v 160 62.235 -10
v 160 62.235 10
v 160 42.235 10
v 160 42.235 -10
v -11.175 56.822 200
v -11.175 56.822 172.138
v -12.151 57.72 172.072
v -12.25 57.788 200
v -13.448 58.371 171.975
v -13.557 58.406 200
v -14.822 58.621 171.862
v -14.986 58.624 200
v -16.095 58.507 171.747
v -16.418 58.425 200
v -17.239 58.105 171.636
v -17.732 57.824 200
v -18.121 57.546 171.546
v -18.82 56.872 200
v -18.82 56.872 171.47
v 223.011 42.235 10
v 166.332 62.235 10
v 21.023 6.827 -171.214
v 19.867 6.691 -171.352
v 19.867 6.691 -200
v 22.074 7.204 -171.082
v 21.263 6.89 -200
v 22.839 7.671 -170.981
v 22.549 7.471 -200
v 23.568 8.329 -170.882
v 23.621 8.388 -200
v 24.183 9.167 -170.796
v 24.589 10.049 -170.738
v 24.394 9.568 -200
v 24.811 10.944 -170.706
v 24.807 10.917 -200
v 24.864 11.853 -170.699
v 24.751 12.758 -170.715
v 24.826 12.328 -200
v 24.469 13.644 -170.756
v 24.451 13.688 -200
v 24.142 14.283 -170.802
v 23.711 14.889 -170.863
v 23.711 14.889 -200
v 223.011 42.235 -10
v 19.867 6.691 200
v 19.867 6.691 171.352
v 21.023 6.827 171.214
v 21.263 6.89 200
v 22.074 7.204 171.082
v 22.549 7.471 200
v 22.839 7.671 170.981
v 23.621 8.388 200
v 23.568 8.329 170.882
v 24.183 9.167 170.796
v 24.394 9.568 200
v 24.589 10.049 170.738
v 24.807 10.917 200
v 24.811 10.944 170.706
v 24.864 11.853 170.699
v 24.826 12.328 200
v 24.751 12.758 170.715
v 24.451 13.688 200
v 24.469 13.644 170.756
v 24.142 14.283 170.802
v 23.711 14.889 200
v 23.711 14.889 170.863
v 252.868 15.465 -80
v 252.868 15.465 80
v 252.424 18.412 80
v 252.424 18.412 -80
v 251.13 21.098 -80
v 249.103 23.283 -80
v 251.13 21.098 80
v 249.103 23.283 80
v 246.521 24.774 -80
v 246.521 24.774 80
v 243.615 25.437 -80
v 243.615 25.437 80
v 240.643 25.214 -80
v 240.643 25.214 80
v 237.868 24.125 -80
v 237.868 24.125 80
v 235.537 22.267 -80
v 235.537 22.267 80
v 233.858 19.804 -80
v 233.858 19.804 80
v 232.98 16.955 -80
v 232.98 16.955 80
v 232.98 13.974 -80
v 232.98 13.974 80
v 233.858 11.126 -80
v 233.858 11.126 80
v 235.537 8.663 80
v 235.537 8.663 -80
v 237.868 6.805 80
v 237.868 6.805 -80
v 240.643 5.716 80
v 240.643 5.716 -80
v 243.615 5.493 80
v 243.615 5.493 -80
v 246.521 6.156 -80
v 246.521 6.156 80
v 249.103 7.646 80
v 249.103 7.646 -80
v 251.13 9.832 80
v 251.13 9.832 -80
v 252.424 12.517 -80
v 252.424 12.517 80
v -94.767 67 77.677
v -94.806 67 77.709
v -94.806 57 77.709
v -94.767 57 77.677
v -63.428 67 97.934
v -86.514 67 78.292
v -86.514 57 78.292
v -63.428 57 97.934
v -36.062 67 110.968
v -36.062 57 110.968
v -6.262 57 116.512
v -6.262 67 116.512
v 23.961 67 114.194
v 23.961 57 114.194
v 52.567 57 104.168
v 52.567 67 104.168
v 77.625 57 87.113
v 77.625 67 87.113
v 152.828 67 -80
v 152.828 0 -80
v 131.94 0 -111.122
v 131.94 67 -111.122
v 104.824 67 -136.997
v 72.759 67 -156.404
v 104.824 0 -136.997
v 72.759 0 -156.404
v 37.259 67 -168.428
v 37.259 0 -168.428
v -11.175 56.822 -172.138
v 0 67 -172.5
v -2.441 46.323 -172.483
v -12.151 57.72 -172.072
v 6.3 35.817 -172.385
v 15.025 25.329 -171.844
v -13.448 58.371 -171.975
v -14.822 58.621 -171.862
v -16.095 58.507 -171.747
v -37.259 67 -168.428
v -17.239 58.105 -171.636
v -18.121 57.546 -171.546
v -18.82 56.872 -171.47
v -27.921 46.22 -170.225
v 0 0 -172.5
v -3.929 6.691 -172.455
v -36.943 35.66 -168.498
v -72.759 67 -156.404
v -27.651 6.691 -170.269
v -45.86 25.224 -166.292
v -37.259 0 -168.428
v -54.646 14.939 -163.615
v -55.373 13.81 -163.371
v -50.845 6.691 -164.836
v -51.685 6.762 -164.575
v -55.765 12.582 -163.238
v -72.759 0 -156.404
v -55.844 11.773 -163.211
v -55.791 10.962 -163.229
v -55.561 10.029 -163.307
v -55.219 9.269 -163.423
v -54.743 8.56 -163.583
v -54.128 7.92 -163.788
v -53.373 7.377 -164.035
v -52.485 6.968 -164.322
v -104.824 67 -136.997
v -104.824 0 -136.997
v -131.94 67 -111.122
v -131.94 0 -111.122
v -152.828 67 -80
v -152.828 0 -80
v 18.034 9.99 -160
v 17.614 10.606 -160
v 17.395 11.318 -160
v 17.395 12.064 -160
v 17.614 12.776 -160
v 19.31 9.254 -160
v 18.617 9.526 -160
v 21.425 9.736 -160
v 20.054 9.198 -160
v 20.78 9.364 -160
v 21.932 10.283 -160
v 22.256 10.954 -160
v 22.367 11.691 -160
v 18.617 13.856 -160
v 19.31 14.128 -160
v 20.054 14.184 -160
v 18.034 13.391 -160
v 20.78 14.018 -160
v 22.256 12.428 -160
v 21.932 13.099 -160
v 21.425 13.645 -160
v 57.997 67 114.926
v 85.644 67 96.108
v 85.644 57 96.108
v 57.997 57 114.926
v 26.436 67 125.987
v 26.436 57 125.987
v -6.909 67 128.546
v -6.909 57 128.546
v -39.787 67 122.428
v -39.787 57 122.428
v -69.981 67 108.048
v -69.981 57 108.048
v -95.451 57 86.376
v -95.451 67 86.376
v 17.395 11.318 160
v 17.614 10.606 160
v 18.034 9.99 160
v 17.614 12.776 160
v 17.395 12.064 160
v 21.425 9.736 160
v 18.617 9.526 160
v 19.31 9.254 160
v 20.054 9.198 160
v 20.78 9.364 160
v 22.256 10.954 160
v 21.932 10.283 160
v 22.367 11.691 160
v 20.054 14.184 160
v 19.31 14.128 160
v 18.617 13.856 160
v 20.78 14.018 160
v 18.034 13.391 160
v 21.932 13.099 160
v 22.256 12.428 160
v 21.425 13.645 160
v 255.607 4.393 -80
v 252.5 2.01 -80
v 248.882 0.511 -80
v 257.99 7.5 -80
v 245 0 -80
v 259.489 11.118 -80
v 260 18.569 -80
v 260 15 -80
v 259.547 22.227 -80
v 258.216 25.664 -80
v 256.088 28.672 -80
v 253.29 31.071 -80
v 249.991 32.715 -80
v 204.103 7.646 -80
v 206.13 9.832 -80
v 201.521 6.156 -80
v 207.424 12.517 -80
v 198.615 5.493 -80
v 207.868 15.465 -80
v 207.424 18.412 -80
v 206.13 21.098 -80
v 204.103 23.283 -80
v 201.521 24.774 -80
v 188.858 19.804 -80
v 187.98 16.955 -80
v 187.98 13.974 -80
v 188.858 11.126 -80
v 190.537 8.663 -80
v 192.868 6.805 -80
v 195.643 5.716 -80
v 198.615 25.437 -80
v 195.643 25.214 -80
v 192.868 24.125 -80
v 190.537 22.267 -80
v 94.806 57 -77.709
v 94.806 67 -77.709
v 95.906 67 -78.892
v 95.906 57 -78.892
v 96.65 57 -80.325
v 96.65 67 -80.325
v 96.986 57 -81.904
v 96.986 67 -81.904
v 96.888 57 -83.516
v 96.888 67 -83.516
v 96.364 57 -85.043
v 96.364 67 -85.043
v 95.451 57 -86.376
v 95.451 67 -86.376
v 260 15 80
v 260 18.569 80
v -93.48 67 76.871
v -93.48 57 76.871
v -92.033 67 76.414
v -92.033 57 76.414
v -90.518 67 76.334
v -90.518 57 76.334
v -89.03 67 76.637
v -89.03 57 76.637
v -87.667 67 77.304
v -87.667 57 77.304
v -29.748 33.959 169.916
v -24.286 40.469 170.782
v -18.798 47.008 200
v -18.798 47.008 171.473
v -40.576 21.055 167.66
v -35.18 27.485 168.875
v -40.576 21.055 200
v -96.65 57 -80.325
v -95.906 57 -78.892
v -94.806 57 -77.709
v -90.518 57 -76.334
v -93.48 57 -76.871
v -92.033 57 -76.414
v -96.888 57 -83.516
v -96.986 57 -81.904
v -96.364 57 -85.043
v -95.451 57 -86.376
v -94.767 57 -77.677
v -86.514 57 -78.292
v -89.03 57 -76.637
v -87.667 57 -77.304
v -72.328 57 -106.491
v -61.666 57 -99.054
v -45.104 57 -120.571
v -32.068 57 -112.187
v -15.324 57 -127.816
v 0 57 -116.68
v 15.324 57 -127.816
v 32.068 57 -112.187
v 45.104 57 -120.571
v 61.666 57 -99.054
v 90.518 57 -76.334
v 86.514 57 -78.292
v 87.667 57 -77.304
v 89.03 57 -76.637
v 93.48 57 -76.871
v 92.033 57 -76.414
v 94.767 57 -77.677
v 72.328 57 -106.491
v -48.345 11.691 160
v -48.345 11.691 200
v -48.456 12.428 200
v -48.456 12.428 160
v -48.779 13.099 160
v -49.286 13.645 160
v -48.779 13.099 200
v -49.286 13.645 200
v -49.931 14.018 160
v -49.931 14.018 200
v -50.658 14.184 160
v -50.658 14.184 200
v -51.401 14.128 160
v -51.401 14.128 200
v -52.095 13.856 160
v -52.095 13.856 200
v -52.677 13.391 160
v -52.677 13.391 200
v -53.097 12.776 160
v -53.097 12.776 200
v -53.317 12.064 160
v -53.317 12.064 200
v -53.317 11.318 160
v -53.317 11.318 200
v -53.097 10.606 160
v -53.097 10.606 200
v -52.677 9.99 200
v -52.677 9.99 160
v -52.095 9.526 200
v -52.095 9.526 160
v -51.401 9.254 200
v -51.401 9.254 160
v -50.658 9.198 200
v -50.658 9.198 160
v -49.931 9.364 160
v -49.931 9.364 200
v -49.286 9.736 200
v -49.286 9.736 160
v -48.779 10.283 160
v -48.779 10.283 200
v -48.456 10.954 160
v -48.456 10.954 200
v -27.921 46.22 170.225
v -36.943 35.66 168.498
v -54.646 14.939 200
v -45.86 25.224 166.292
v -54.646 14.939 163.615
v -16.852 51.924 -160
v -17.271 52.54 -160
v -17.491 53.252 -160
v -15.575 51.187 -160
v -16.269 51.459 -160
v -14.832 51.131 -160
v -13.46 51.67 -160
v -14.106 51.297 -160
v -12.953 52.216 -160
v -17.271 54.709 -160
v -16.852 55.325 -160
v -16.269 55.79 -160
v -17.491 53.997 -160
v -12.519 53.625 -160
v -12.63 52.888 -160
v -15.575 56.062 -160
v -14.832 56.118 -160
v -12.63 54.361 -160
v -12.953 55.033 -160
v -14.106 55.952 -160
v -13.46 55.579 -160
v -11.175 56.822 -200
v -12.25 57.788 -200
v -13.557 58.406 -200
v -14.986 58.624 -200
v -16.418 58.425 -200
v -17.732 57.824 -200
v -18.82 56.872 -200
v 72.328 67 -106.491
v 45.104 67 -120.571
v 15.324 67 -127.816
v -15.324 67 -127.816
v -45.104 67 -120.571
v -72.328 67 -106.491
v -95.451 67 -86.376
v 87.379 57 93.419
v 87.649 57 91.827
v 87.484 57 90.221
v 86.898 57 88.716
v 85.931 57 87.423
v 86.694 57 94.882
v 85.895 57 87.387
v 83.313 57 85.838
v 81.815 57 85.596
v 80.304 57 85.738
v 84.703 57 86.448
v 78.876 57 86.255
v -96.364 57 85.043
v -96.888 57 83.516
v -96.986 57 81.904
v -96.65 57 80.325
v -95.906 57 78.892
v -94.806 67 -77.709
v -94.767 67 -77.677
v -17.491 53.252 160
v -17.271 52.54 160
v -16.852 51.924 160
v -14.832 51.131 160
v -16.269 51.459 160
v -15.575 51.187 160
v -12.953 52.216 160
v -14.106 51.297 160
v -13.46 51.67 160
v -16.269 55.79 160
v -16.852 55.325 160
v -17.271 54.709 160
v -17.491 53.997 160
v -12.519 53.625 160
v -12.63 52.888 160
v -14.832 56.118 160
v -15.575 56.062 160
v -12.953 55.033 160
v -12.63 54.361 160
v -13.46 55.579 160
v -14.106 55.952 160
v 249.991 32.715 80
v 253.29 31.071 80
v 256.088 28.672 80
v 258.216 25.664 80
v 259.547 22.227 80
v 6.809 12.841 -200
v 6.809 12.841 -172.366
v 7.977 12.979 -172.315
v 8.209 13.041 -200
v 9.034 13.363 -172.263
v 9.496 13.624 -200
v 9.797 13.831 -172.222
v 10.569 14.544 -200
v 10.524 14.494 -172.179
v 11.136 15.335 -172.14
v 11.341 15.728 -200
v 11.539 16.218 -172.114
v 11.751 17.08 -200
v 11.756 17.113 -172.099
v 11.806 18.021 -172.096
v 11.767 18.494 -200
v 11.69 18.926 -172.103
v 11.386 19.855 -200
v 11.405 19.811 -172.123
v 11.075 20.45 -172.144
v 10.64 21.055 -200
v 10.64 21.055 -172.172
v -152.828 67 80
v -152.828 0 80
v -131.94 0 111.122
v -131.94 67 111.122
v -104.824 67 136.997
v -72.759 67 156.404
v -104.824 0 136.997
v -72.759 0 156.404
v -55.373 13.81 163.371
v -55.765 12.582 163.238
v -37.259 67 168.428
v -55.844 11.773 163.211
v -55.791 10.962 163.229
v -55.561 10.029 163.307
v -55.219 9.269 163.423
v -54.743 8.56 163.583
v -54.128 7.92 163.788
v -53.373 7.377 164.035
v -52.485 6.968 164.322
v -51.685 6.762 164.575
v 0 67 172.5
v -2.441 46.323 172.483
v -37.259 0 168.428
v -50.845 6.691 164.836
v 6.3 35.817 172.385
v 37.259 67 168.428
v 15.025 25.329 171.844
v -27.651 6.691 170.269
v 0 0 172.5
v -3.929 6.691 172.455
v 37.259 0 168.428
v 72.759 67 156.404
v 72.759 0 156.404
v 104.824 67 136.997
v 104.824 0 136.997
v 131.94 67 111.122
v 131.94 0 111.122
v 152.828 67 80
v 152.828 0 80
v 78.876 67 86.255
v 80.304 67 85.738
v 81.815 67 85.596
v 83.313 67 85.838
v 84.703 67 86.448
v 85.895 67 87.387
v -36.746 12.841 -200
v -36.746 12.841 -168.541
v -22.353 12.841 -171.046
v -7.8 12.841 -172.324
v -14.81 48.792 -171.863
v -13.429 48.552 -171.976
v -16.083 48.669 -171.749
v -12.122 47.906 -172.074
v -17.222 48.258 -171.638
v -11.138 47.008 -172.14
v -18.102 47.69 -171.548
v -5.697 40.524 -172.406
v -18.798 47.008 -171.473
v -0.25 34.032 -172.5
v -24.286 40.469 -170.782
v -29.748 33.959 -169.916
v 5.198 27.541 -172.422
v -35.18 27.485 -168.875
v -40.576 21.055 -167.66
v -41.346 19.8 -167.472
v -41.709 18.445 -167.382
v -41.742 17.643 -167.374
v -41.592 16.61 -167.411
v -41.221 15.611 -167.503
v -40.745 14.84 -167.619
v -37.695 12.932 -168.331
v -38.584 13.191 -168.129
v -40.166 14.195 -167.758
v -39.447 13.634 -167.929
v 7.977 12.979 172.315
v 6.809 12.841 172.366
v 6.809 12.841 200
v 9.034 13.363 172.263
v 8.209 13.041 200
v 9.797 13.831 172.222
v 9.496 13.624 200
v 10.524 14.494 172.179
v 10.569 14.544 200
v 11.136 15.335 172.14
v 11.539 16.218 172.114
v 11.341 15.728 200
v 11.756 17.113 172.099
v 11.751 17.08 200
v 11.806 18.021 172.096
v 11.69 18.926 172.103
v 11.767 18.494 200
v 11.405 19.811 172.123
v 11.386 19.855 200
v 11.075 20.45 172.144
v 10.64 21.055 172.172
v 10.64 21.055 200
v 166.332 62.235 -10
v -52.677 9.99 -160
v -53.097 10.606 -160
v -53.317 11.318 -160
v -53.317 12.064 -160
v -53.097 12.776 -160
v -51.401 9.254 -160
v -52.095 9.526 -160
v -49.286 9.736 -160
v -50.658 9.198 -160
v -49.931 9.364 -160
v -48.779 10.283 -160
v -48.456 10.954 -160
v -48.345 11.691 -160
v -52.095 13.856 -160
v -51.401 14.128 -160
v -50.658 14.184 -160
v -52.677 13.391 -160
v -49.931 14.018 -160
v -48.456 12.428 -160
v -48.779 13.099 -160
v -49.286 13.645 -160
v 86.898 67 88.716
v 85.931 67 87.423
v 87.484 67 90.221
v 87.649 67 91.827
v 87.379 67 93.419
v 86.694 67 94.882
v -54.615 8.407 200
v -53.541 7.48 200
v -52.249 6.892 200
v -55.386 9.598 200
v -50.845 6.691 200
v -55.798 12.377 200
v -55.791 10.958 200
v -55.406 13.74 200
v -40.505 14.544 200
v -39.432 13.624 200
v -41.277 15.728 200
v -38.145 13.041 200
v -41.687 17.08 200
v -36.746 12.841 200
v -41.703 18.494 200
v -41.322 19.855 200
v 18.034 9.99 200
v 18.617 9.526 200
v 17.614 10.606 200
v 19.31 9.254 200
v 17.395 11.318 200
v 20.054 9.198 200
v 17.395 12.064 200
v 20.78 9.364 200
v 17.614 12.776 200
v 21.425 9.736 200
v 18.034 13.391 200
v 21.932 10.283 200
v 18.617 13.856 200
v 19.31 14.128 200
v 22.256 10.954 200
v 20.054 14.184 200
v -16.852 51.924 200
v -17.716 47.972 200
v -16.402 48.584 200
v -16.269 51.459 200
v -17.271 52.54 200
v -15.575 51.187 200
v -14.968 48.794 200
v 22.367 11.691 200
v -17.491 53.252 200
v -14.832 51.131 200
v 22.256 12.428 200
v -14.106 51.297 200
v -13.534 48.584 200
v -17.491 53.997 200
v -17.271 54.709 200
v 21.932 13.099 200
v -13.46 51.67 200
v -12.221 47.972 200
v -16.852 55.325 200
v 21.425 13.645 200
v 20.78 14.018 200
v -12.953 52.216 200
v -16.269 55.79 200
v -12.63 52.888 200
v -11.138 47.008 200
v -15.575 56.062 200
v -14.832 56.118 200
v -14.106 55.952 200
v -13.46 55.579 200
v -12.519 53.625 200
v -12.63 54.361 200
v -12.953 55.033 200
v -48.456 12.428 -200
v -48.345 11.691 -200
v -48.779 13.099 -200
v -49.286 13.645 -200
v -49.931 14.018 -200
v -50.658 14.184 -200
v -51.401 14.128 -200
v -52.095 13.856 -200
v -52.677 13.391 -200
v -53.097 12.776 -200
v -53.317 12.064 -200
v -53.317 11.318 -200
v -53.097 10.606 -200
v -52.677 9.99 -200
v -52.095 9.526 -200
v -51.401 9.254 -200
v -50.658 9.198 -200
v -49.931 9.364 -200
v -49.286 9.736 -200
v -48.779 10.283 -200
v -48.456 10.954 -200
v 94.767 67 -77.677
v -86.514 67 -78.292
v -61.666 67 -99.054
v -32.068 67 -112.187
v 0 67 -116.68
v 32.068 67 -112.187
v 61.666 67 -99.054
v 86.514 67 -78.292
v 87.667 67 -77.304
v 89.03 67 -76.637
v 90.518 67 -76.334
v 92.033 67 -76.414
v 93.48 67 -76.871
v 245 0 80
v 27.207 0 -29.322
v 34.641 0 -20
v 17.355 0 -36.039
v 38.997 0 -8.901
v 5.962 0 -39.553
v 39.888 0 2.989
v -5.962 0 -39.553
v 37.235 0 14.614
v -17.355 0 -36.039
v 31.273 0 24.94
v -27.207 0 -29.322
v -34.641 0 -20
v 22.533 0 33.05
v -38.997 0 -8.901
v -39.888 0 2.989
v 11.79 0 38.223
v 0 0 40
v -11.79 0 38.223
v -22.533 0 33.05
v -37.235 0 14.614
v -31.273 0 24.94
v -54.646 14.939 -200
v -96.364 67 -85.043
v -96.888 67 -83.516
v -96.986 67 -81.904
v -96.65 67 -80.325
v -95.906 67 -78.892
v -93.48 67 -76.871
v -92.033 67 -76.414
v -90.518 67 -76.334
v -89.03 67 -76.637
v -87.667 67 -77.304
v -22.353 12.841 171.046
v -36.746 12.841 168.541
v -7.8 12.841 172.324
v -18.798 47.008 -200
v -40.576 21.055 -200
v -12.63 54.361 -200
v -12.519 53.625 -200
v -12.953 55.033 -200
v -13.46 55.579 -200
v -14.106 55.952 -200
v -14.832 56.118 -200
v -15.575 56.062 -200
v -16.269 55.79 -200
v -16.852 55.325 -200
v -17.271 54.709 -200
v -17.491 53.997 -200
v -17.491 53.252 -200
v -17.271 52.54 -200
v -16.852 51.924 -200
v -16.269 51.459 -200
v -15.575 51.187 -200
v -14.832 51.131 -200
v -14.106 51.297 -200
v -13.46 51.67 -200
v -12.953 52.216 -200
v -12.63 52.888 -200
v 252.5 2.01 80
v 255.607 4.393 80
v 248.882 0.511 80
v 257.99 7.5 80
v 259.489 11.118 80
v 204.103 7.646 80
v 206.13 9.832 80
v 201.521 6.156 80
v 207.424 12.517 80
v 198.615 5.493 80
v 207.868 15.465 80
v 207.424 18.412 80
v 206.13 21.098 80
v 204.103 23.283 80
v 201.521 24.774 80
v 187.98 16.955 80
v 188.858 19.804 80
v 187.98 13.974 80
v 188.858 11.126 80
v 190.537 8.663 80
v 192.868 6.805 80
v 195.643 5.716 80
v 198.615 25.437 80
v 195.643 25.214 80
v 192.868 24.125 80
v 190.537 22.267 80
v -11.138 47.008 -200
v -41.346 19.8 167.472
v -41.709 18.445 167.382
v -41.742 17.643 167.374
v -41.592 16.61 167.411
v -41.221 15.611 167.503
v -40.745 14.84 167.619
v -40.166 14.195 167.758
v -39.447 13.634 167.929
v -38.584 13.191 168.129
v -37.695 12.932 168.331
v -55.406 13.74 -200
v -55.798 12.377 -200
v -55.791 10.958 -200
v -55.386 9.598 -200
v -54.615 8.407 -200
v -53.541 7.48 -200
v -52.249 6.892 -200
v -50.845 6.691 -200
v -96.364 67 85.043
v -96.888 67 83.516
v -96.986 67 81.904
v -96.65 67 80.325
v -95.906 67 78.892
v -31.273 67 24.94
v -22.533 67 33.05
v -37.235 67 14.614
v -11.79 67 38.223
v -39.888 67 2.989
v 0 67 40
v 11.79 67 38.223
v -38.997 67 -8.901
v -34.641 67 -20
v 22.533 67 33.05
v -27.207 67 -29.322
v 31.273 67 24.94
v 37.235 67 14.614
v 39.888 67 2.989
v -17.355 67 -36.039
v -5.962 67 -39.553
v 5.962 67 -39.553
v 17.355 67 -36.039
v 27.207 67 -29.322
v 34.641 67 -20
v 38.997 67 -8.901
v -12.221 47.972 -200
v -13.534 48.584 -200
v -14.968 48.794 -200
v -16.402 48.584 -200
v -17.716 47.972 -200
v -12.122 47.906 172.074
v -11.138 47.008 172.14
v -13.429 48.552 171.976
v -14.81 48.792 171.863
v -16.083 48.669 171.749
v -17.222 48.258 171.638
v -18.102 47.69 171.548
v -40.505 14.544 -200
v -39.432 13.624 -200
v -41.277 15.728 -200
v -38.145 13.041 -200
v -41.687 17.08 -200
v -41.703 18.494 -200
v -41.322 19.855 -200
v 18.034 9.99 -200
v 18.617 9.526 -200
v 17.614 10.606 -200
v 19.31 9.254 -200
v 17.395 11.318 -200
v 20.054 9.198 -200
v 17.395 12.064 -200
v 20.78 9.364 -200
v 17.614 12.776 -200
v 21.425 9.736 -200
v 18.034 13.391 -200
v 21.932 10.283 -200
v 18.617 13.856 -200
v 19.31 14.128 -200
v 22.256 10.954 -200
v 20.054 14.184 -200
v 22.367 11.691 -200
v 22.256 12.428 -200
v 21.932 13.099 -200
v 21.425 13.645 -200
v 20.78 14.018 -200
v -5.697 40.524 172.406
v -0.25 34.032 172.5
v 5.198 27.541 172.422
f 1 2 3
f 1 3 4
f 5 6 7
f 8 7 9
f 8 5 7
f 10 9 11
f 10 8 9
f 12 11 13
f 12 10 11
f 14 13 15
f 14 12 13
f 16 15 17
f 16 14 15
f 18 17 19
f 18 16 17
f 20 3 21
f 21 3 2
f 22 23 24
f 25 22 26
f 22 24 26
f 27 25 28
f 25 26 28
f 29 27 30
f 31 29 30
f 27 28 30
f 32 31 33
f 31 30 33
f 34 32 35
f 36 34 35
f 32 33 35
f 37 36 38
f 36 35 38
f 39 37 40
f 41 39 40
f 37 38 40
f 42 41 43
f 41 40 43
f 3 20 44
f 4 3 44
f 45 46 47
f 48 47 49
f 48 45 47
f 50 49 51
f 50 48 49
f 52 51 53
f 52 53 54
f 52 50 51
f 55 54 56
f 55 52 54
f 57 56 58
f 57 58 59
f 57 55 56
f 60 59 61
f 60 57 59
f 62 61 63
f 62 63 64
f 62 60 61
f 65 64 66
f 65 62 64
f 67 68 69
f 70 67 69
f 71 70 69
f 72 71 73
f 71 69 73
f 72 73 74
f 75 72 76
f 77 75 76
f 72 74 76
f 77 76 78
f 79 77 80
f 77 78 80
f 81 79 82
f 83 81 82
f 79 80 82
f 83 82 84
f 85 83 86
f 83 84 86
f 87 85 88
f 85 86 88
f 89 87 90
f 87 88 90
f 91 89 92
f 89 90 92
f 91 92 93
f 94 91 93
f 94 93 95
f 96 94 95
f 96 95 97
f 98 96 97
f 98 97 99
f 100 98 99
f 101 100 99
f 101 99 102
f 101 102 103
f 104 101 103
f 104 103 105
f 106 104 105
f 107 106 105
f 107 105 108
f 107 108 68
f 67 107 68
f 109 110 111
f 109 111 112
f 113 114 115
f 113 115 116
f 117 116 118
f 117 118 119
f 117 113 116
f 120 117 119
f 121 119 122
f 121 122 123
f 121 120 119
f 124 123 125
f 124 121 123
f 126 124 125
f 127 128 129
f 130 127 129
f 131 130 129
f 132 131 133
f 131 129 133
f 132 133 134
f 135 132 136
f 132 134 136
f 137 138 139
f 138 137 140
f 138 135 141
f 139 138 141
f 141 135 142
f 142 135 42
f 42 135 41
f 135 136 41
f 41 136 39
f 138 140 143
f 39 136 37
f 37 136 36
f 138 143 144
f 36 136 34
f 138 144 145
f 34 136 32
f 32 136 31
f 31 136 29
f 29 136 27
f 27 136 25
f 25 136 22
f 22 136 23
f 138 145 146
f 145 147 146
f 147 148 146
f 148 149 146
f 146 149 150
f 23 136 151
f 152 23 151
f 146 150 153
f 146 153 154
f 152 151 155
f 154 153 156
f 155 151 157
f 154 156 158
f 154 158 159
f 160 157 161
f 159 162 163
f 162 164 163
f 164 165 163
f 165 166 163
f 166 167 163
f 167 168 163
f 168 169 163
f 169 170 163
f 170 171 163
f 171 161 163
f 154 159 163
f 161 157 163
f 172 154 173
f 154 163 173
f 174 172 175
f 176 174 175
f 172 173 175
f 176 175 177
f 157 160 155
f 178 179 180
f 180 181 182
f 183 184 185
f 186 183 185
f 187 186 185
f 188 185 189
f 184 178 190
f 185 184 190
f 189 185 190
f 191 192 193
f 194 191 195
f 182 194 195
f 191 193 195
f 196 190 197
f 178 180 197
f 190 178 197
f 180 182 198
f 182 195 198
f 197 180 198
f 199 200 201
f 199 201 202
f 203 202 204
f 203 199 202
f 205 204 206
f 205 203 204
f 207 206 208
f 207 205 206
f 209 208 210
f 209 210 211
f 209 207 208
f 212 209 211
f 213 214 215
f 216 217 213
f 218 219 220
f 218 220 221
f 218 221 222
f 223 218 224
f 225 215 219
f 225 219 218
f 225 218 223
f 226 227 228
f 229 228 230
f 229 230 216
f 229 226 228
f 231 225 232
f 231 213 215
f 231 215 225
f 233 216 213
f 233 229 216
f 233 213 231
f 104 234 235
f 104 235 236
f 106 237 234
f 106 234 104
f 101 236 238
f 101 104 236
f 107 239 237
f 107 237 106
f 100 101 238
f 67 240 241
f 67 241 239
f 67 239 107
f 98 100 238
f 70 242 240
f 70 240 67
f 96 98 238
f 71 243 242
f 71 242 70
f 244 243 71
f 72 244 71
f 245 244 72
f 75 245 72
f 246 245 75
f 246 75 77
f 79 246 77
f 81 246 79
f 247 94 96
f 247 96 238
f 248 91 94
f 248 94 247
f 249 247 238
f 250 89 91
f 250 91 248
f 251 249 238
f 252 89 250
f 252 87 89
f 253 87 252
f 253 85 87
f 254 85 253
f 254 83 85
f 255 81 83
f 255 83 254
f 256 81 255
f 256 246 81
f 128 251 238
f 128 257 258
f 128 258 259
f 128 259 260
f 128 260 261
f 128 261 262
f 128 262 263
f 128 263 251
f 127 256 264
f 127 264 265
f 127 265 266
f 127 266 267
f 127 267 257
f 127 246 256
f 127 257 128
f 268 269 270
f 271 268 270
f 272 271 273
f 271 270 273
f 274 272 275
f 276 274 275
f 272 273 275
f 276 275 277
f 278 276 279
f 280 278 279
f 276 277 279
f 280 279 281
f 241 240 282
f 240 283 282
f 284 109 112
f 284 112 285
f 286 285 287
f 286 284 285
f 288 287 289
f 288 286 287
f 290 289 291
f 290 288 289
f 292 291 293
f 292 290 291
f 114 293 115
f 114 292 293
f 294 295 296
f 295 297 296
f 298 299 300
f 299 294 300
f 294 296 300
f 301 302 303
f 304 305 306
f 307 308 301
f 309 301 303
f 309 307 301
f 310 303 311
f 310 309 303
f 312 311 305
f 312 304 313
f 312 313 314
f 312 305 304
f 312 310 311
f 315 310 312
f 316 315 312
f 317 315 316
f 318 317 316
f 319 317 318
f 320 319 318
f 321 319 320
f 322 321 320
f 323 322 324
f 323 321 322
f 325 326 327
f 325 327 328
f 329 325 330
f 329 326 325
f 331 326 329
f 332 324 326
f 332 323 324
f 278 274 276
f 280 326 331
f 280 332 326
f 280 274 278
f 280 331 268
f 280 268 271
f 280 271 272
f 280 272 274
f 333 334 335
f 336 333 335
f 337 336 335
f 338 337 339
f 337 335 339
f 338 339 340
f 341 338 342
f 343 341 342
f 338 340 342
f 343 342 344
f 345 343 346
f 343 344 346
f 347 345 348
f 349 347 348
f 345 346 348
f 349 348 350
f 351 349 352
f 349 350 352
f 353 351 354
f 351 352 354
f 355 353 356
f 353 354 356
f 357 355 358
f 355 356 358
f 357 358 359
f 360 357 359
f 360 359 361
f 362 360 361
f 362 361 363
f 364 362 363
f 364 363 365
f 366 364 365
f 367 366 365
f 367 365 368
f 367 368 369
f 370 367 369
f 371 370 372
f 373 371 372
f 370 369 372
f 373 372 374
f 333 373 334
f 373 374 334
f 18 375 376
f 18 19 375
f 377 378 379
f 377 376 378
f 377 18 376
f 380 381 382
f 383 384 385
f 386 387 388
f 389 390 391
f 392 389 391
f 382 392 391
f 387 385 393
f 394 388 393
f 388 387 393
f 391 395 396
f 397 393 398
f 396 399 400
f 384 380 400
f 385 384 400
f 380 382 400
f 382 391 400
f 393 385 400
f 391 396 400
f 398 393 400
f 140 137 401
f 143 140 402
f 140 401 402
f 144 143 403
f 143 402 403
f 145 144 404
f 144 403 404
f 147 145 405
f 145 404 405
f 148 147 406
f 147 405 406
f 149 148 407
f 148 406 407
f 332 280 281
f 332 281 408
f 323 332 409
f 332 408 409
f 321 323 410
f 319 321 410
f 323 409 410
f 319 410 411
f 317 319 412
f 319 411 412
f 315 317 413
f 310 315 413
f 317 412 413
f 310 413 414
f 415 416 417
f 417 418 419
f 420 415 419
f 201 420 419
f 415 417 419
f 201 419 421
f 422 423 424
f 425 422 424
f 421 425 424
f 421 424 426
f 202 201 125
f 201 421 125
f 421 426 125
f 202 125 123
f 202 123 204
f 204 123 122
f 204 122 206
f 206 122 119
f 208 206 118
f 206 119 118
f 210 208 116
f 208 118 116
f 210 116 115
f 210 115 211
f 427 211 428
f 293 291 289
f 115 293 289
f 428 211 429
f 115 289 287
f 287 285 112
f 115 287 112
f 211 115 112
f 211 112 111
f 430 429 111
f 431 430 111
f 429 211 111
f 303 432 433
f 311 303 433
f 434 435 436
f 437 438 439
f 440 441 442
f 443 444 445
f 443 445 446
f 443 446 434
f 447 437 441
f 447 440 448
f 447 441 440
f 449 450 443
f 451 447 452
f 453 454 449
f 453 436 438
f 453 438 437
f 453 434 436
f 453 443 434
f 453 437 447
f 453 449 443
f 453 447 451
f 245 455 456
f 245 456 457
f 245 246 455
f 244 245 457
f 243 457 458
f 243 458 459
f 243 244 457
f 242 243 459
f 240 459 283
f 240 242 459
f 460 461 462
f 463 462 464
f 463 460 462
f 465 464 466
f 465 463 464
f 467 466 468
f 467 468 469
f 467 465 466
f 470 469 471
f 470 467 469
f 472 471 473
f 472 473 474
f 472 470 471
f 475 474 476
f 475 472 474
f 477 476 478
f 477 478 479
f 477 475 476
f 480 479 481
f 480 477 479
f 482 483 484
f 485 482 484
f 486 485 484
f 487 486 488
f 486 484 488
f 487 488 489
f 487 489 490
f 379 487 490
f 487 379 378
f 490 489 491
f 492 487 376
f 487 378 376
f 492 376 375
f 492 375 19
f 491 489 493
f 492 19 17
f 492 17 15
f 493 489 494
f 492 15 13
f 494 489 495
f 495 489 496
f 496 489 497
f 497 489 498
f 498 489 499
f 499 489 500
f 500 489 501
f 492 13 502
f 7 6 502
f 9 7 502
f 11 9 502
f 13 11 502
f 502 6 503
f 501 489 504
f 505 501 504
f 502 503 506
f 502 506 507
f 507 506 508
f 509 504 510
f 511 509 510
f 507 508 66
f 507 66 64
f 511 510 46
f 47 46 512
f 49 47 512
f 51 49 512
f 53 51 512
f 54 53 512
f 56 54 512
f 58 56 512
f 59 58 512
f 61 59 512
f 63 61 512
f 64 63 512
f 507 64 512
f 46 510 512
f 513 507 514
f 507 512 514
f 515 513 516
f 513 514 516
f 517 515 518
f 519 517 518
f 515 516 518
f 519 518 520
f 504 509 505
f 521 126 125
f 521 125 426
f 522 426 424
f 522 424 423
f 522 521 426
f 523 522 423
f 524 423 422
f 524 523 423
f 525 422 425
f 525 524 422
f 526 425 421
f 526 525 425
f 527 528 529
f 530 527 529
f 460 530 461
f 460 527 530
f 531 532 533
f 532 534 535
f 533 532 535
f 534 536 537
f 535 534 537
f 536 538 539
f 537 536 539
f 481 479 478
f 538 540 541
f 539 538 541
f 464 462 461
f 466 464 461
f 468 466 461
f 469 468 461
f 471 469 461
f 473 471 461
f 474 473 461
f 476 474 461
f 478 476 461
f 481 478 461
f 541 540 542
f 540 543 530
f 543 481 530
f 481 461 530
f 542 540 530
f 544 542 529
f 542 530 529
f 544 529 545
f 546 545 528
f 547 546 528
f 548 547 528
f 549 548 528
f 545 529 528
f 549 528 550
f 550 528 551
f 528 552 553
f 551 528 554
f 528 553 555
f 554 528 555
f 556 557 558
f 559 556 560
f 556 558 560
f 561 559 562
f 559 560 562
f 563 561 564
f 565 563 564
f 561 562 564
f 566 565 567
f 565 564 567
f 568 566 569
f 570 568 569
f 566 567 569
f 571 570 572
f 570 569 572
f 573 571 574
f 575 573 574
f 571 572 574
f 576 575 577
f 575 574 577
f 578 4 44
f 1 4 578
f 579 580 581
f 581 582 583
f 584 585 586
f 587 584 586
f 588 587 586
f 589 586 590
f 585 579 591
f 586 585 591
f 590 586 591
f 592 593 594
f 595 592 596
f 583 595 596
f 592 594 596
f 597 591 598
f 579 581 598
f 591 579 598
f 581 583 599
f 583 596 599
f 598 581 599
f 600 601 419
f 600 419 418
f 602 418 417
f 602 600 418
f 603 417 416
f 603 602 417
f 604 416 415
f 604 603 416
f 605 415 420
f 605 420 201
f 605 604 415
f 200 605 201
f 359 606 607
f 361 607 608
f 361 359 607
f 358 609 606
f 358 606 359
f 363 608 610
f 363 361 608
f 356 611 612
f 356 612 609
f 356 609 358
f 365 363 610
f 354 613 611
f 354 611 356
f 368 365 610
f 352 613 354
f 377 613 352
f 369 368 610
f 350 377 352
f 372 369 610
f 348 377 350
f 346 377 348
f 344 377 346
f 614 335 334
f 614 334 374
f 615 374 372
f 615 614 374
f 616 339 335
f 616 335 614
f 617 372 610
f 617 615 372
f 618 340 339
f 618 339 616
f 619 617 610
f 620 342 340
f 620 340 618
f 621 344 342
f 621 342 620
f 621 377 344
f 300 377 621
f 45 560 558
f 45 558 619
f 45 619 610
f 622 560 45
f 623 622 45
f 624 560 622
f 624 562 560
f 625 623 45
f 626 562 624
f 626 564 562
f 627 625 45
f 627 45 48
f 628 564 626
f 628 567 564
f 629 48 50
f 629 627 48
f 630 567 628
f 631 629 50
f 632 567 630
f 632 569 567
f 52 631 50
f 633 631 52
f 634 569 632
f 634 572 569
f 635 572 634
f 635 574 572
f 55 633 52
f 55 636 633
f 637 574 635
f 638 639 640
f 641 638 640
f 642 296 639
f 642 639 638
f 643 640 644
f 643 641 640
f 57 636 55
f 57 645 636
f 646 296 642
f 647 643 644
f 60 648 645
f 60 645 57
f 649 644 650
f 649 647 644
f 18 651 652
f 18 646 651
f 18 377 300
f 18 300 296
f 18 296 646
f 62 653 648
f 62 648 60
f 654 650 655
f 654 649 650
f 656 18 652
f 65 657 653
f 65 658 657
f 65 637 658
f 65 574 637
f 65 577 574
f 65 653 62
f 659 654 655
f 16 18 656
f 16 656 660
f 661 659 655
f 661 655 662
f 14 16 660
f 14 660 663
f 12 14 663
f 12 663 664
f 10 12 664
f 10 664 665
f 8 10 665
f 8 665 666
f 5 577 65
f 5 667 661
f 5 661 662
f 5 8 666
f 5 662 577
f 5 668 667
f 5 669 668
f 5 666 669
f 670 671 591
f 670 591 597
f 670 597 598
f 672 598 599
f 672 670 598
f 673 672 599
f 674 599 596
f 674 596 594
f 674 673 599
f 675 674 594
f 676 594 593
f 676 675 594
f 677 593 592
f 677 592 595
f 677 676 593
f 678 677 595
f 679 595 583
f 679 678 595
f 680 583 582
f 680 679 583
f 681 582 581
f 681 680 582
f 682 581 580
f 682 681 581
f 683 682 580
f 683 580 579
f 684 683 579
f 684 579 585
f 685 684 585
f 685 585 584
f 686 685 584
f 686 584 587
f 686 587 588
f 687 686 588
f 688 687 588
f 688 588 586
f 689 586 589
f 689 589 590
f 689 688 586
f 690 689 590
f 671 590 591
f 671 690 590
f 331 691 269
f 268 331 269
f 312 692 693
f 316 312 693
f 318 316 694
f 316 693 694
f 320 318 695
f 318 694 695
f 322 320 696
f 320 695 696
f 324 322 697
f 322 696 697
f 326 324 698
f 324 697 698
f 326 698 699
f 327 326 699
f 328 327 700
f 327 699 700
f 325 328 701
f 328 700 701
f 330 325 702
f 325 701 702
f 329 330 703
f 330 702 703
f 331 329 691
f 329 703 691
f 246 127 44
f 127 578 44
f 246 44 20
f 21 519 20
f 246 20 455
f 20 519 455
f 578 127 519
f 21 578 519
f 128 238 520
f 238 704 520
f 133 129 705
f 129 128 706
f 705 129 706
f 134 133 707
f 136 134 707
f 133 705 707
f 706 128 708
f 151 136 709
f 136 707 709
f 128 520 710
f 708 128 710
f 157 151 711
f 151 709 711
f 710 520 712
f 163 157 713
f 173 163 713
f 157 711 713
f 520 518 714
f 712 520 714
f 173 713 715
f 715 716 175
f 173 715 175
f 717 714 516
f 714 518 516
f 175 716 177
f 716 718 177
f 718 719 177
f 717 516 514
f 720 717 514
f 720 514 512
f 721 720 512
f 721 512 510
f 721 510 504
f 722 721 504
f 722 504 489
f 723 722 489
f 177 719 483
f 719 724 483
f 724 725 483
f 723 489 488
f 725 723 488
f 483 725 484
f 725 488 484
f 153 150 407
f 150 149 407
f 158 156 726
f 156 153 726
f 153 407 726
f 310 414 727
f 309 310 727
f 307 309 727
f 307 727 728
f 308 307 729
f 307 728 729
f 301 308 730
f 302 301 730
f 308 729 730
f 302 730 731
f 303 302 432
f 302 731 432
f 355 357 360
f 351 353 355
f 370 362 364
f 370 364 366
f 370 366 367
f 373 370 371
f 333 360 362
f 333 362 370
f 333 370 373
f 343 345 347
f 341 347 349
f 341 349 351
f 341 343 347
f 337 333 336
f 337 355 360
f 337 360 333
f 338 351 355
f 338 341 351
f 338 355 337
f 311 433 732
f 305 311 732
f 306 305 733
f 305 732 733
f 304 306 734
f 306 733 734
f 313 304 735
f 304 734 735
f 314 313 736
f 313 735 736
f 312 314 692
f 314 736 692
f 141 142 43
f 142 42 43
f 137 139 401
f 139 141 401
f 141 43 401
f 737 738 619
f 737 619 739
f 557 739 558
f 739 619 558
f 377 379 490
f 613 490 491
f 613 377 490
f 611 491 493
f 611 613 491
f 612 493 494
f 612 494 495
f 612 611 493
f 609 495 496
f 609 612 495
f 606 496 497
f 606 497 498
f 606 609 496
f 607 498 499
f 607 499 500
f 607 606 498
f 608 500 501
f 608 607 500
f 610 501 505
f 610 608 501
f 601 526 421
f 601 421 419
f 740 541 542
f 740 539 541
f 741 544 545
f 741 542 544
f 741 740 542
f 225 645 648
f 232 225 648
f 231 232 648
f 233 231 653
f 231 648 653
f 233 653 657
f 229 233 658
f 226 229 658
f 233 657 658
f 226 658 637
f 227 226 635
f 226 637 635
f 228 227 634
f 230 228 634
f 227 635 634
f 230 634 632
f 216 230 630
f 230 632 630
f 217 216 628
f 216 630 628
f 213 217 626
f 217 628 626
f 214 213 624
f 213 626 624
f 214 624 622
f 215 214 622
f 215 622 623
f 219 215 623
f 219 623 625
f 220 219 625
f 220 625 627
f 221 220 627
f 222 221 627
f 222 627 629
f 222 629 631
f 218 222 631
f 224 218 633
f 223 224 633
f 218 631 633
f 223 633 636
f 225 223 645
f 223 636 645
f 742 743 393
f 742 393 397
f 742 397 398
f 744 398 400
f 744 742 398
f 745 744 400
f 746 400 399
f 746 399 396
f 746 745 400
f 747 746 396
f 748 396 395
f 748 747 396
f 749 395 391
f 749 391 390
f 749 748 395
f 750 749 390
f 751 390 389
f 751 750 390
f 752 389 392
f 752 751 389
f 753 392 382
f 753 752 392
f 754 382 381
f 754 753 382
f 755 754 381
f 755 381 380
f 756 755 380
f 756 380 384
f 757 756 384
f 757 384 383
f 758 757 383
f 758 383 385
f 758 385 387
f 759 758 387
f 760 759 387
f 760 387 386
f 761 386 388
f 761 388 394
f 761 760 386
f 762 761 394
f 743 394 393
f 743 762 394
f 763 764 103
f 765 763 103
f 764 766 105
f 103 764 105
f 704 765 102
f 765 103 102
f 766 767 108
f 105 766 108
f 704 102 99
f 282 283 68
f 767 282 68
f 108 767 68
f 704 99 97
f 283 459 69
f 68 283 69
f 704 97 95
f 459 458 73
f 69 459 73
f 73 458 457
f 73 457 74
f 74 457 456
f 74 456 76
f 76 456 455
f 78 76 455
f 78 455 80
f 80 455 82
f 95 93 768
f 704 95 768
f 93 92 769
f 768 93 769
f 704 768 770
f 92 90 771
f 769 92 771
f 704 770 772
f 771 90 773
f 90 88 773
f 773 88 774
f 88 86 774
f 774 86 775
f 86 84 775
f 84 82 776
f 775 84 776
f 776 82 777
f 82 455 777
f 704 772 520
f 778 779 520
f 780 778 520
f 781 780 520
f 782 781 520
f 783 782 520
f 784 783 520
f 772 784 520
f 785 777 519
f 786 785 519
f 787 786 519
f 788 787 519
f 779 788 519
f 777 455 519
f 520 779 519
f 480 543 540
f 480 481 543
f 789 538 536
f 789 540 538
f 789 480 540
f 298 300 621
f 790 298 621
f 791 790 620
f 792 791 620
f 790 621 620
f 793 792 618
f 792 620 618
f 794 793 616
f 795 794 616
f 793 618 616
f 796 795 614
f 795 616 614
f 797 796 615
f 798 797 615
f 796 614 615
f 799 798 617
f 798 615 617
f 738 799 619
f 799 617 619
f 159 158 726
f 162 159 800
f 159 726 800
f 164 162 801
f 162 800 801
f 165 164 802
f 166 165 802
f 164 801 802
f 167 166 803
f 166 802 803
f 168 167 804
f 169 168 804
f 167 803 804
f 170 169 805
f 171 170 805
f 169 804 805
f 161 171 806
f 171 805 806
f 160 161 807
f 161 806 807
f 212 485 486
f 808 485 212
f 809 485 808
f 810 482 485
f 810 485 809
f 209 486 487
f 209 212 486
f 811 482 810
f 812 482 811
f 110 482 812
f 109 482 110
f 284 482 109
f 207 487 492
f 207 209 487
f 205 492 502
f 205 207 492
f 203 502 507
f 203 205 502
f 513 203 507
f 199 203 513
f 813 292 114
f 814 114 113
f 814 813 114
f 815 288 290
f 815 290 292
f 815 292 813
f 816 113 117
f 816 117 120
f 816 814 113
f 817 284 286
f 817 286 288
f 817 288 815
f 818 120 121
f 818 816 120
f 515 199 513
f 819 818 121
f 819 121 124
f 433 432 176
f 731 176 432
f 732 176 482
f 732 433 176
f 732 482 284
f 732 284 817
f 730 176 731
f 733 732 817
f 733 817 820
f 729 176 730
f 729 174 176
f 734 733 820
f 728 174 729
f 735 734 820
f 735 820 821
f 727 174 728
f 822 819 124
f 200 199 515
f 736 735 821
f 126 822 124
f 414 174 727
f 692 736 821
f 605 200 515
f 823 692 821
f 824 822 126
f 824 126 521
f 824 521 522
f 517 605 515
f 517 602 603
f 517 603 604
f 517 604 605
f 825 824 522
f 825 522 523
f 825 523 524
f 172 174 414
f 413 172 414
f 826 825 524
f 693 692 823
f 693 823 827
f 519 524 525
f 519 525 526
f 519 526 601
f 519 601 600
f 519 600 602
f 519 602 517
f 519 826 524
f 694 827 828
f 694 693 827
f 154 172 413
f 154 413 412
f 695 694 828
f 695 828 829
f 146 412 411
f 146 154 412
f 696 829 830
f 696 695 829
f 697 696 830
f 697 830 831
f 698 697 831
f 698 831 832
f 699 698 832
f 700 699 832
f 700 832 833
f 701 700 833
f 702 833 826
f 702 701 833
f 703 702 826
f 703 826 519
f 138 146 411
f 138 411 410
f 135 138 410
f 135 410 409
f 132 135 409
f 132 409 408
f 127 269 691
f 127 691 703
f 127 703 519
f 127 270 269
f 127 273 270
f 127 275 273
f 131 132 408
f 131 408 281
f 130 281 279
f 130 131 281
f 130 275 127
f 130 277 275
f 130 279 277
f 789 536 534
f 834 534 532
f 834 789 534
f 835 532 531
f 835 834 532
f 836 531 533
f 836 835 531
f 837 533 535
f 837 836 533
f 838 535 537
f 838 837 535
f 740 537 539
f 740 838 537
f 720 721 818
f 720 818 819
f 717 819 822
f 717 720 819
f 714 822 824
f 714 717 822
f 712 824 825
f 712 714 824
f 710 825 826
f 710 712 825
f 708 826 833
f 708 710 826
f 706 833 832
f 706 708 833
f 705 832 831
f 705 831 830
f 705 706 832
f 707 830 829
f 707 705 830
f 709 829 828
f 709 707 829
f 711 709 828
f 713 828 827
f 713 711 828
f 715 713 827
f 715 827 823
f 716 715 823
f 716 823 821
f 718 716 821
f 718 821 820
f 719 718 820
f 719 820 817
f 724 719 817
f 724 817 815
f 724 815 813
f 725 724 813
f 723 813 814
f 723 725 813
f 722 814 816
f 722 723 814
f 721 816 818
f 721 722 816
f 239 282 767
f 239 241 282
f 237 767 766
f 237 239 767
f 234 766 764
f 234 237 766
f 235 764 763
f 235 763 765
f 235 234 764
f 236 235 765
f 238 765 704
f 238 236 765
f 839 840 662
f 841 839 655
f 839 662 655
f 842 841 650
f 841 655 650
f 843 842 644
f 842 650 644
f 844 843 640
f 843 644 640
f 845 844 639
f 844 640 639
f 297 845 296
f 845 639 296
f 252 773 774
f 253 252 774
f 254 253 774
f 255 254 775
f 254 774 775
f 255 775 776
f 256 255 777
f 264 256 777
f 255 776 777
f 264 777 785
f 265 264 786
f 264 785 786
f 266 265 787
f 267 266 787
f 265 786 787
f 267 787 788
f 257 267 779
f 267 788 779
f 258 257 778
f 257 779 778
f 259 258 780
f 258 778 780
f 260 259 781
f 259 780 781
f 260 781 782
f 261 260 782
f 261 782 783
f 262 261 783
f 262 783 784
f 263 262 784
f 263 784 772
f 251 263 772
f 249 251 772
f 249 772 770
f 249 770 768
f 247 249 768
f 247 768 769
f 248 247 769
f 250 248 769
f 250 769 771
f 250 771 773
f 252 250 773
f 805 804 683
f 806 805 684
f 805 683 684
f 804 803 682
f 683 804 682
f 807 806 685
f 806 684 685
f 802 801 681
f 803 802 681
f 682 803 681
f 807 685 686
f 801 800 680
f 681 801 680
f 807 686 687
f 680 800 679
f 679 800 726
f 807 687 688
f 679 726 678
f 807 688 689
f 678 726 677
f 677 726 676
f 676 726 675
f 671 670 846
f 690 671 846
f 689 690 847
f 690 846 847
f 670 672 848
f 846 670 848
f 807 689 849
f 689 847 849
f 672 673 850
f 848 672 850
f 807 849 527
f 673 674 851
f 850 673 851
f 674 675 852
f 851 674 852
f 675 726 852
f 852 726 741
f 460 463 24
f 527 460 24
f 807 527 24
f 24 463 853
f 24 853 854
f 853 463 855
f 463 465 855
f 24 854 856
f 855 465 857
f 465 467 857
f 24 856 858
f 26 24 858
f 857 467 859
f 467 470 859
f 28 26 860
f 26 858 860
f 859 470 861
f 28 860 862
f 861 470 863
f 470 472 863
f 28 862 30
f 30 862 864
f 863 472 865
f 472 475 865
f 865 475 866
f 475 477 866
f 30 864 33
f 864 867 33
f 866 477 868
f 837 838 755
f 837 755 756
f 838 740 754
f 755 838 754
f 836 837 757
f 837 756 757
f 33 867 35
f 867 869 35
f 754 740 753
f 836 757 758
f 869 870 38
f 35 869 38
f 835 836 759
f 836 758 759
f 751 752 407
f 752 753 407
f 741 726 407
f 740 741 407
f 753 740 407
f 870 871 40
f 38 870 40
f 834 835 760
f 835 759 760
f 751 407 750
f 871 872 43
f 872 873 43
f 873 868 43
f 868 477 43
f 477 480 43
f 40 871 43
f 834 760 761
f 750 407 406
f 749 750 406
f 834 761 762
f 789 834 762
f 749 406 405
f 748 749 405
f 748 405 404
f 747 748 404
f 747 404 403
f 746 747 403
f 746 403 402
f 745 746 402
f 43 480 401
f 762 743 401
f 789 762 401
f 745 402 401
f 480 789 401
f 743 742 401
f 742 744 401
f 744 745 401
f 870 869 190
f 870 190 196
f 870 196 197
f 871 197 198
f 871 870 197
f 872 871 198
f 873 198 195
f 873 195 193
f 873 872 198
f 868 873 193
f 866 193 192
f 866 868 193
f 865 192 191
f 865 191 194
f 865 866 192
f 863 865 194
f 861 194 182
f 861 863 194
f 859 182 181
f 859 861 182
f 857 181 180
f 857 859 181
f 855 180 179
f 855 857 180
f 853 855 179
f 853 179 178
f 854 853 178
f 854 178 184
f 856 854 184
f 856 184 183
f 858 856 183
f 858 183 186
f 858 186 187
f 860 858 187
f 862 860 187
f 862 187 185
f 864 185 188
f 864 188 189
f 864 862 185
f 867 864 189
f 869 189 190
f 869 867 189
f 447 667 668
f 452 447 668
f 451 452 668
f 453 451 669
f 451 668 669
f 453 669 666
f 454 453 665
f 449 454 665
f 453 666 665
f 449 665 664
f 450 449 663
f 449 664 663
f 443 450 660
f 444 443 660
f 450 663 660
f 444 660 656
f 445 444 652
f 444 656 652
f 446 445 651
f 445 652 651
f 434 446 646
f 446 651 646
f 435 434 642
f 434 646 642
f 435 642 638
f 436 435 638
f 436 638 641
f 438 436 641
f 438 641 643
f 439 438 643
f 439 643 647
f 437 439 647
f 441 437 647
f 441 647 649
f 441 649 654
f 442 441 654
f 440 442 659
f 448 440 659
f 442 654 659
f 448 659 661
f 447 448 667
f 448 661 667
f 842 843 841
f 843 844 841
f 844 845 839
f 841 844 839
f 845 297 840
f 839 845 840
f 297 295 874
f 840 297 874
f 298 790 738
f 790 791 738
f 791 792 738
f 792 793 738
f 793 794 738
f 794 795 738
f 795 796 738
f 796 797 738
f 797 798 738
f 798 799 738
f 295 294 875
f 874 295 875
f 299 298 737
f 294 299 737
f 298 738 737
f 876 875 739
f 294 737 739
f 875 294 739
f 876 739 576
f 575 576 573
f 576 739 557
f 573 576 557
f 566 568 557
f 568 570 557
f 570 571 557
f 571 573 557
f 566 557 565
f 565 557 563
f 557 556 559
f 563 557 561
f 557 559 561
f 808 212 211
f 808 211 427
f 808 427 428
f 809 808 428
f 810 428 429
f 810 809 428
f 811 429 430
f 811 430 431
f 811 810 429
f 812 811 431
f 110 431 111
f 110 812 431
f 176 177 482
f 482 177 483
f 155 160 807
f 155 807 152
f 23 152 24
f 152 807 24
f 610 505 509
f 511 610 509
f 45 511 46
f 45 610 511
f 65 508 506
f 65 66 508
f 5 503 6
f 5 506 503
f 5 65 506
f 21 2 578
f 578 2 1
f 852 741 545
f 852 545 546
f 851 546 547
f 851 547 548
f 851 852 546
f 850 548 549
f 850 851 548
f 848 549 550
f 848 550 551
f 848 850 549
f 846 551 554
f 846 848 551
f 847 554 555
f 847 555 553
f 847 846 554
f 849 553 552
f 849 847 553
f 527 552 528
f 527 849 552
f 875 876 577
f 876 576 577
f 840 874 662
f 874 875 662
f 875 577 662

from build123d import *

# Parameters (mm, degrees)
SKETCH1_R                = 40
BOSS_EXTRUDE1_DEPTH      = 67
CUT_EXTRUDE1_DEPTH       = 10
BOSS_EXTRUDE2_DEPTH      = 80
CUT_EXTRUDE2_REACH       = 370.572
SKETCH4_R                = 10
FILLET1_R                = 15
CUT_EXTRUDE5_REACH       = 365.464
SKETCH6_W                = 20
SKETCH6_H                = 20
BOSS_EXTRUDE3_REACH      = 461.179
BOSS_EXTRUDE3_END_RADIUS = 172.5
SKETCH8_R                = 2.5
CUT_EXTRUDE6_DEPTH       = 40


with BuildPart() as part:
    # Sketch1 → Boss-Extrude1 (new body)
    with BuildSketch(Plane(origin=(0, 0, 0), x_dir=(1, 0, 0), z_dir=(0, 1, 0))):
        with BuildLine():
            Line((-152.827517156, 80), (-152.827517156, -80))
            ThreePointArc((-152.827517156, -80), (0, -172.5), (152.827517156, -80))
            Line((152.827517156, -80), (152.827517156, 80))
            ThreePointArc((152.827517156, 80), (0, 172.5), (-152.827517156, 80))
        make_face()
        with Locations(Location((0, 0, 0), (0, 0, 270))):
            Circle(SKETCH1_R, mode=Mode.SUBTRACT)
    extrude(amount=BOSS_EXTRUDE1_DEPTH)

    # Sketch2 → Cut-Extrude1 (cut)
    with BuildSketch(Plane(origin=(0, 67, 0), x_dir=(1, 0, 0), z_dir=(0, 1, 0))):
        with BuildLine():
            Line((-94.805792729, 77.709483627), (-94.766560633, 77.677326247))
            ThreePointArc((-94.766560633, 77.677326247), (-90.5175234, 76.33424343), (-86.514217379, 78.291723895))
            ThreePointArc((-86.514217379, 78.291723895), (0, 116.680348985), (86.514217379, 78.291723895))
            ThreePointArc((86.514217379, 78.291723895), (90.5175234, 76.33424343), (94.766560633, 77.677326247))
            Line((94.766560633, 77.677326247), (94.805792729, 77.709483627))
            ThreePointArc((94.805792729, 77.709483627), (96.985665668, 81.904305313), (95.451092594, 86.375710069))
            ThreePointArc((95.451092594, 86.375710069), (0, 128.731015561), (-95.451092594, 86.375710069))
            ThreePointArc((-95.451092594, 86.375710069), (-96.985665668, 81.904305313), (-94.805792729, 77.709483627))
        make_face()
        with BuildLine():
            Line((-94.805792729, -77.709483627), (-94.766560633, -77.677326247))
            ThreePointArc((-94.766560633, -77.677326247), (-90.5175234, -76.33424343), (-86.514217379, -78.291723895))
            ThreePointArc((-86.514217379, -78.291723895), (-6.261835306, -116.512202184), (77.624689613, -87.11321026))
            ThreePointArc((77.624689613, -87.11321026), (81.814735563, -85.59607355), (85.895347897, -87.386825304))
            Line((85.895347897, -87.386825304), (85.930907429, -87.423002288))
            ThreePointArc((85.930907429, -87.423002288), (87.648629228, -91.827296423), (85.643657226, -96.108471762))
            ThreePointArc((85.643657226, -96.108471762), (-6.90855337, -128.545502674), (-95.451092594, -86.375710069))
            ThreePointArc((-95.451092594, -86.375710069), (-96.985665668, -81.904305313), (-94.805792729, -77.709483627))
        make_face()
    extrude(amount=-CUT_EXTRUDE1_DEPTH, mode=Mode.SUBTRACT)

    # Sketch3 → Boss-Extrude2 (add, symmetric)
    with BuildSketch(Plane.XY):
        Polygon((152.827517156, 67), (260, 29.182962561), (260, 0), (152.827517156, 0), align=None)
    extrude(amount=BOSS_EXTRUDE2_DEPTH, both=True)

    # Sketch4 → Cut-Extrude2 (cut, up to next)
    with BuildSketch(Plane.XY.offset(80), mode=Mode.PRIVATE) as cut_extrude2_sk1:
        with Locations((197.867868221, 15.46479665)):
            Circle(SKETCH4_R)
    cut_extrude2_tool1 = extrude(cut_extrude2_sk1.sketch, amount=-CUT_EXTRUDE2_REACH, mode=Mode.PRIVATE) & part.part
    # Sketch4 → Cut-Extrude2 (cut, up to next)
    with BuildSketch(Plane.XY.offset(80), mode=Mode.PRIVATE) as cut_extrude2_sk2:
        with Locations((242.867868221, 15.46479665)):
            Circle(SKETCH4_R)
    cut_extrude2_tool2 = extrude(cut_extrude2_sk2.sketch, amount=-CUT_EXTRUDE2_REACH, mode=Mode.PRIVATE) & part.part
    add(cut_extrude2_tool1.solids().sort_by_distance((197.867868, 15.464797, 80))[0], mode=Mode.SUBTRACT)
    add(cut_extrude2_tool2.solids().sort_by_distance((242.867868, 15.464797, 80))[0], mode=Mode.SUBTRACT)

    # Fillet1
    fillet1_edges = [part.edges().sort_by_distance(p)[0] for p in [
        (260, 0, 0),
        (260, 29.182962561, 0),
    ]]
    fillet(fillet1_edges, radius=FILLET1_R)

    # Cut-Extrude5: up to this plane
    cut_extrude5_end = Plane(origin=(152.827517156, 67, 80), z_dir=(-0.3327532596919791, -0.9430139278740067, 0))
    # Sketch6 → Cut-Extrude5 (cut, up to the surface)
    with BuildSketch(Plane(origin=(160, 0, 0), x_dir=(0, 0, -1), z_dir=(1, 0, 0)), mode=Mode.PRIVATE) as cut_extrude5_sk1:
        with Locations((0, 52.234802616)):
            Rectangle(SKETCH6_W, SKETCH6_H)
    cut_extrude5_tool1 = split(extrude(cut_extrude5_sk1.sketch, amount=CUT_EXTRUDE5_REACH, mode=Mode.PRIVATE), bisect_by=cut_extrude5_end, keep=Keep.BOTH, mode=Mode.PRIVATE)
    add(cut_extrude5_tool1.solids().sort_by_distance((160, 52.234803, 0))[0], mode=Mode.SUBTRACT)

    # Boss-Extrude3: up to this cylinder (the profile starts outside it)
    boss_extrude3_end = Plane(origin=(0, 35.241624, 0), z_dir=(0, -1, 0)) * Cylinder(BOSS_EXTRUDE3_END_RADIUS, 1268.358, mode=Mode.PRIVATE)
    # Sketch7 → Boss-Extrude3 (add, up to the surface)
    with BuildSketch(Plane.XY.offset(200), mode=Mode.PRIVATE) as boss_extrude3_sk1:
        with BuildLine():
            Line((-18.820406998, 56.872330571), (-54.64630767, 14.938742986))
            ThreePointArc((-54.64630767, 14.938742986), (-55.385658765, 9.597966882), (-50.844780808, 6.690913939))
            Line((-50.844780808, 6.690913939), (19.866759041, 6.690913939))
            ThreePointArc((19.866759041, 6.690913939), (24.393824394, 9.568255396), (23.71052462, 14.888642223))
            Line((23.71052462, 14.888642223), (-11.175114557, 56.822229808))
            ThreePointArc((-11.175114557, 56.822229808), (-14.986115079, 58.624394168), (-18.820406998, 56.872330571))
        make_face()
        with BuildLine():
            Line((-18.798269892, 47.008349057), (-40.57573529, 21.054976432))
            ThreePointArc((-40.57573529, 21.054976432), (-41.277052009, 15.727947075), (-36.745513074, 12.841038384))
            Line((-36.745513074, 12.841038384), (6.809417721, 12.841038384))
            ThreePointArc((6.809417721, 12.841038384), (11.340956656, 15.727947075), (10.639639936, 21.054976432))
            Line((10.639639936, 21.054976432), (-11.137825461, 47.008349057))
            ThreePointArc((-11.137825461, 47.008349057), (-14.968047677, 48.794411009), (-18.798269892, 47.008349057))
        make_face(mode=Mode.SUBTRACT)
    boss_extrude3_tool1 = extrude(boss_extrude3_sk1.sketch, amount=-BOSS_EXTRUDE3_REACH, mode=Mode.PRIVATE) - boss_extrude3_end
    boss_extrude3 = boss_extrude3_tool1.solids().sort_by_distance((5.529884, 35.241624, 200))[0]
    add(boss_extrude3)

    # Sketch8 → Cut-Extrude6 (cut)
    with BuildSketch(Plane.XY.offset(200)):
        with Locations((-15.018880135, 53.624501524)):
            Circle(SKETCH8_R)
        with Locations((19.866759041, 11.690913939)):
            Circle(SKETCH8_R)
        with Locations((-50.844780808, 11.690913939)):
            Circle(SKETCH8_R)
    cut_extrude6 = extrude(amount=-CUT_EXTRUDE6_DEPTH, mode=Mode.SUBTRACT)

    # Mirror1: Boss-Extrude3, Cut-Extrude6 across plane
    add(boss_extrude3.mirror(Plane.XY))
    add(cut_extrude6.mirror(Plane.XY), mode=Mode.SUBTRACT)


solid = part.part
